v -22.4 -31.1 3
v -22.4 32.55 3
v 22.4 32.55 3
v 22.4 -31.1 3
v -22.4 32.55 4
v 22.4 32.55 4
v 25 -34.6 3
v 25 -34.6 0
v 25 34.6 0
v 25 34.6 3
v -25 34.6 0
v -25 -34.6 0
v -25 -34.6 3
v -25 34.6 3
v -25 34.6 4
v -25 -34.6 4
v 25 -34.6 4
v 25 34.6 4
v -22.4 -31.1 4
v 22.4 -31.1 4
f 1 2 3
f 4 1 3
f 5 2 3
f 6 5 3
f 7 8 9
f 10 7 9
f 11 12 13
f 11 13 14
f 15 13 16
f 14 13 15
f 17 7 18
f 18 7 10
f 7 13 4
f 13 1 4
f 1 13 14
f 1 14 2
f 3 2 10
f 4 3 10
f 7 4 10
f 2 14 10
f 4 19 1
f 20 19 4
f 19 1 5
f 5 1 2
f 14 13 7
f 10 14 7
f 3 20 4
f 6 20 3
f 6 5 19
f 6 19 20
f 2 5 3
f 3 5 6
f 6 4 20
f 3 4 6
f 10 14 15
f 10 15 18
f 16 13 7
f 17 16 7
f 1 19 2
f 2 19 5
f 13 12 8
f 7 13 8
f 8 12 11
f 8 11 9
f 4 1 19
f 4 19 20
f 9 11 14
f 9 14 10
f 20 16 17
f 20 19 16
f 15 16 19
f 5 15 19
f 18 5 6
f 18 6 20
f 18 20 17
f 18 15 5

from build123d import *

# Parameters (mm, degrees)
F0_W     = 50
F0_H     = 69.2
F1_DEPTH = 3
F2_W     = 50
F2_H     = 69.2
F2_W_2   = 44.8
F2_H_2   = 63.65
F3_DEPTH = 1
F4_W     = 44.8
F4_H     = 63.65
F5_DEPTH = 1


with BuildPart() as f1:
    # F0 (on Top) → F1 (new body)
    with BuildSketch(Plane.XY):
        Rectangle(F0_W, F0_H)
    extrude(amount=F1_DEPTH)


with BuildPart() as f3:
    # F2 (on face) → F3 (new body)
    with BuildSketch(Plane.XY.offset(3)):
        Rectangle(F2_W, F2_H)
        with Locations((0, 0.725)):
            Rectangle(F2_W_2, F2_H_2, mode=Mode.SUBTRACT)
    extrude(amount=F3_DEPTH)


with BuildPart() as f5:
    # F4 (on face) → F5 (new body)
    with BuildSketch(Plane.XY.offset(4)):
        with Locations((0, 0.725)):
            Rectangle(F4_W, F4_H)
    extrude(amount=-F5_DEPTH)


solid = Compound([f1.part, f3.part, f5.part])
